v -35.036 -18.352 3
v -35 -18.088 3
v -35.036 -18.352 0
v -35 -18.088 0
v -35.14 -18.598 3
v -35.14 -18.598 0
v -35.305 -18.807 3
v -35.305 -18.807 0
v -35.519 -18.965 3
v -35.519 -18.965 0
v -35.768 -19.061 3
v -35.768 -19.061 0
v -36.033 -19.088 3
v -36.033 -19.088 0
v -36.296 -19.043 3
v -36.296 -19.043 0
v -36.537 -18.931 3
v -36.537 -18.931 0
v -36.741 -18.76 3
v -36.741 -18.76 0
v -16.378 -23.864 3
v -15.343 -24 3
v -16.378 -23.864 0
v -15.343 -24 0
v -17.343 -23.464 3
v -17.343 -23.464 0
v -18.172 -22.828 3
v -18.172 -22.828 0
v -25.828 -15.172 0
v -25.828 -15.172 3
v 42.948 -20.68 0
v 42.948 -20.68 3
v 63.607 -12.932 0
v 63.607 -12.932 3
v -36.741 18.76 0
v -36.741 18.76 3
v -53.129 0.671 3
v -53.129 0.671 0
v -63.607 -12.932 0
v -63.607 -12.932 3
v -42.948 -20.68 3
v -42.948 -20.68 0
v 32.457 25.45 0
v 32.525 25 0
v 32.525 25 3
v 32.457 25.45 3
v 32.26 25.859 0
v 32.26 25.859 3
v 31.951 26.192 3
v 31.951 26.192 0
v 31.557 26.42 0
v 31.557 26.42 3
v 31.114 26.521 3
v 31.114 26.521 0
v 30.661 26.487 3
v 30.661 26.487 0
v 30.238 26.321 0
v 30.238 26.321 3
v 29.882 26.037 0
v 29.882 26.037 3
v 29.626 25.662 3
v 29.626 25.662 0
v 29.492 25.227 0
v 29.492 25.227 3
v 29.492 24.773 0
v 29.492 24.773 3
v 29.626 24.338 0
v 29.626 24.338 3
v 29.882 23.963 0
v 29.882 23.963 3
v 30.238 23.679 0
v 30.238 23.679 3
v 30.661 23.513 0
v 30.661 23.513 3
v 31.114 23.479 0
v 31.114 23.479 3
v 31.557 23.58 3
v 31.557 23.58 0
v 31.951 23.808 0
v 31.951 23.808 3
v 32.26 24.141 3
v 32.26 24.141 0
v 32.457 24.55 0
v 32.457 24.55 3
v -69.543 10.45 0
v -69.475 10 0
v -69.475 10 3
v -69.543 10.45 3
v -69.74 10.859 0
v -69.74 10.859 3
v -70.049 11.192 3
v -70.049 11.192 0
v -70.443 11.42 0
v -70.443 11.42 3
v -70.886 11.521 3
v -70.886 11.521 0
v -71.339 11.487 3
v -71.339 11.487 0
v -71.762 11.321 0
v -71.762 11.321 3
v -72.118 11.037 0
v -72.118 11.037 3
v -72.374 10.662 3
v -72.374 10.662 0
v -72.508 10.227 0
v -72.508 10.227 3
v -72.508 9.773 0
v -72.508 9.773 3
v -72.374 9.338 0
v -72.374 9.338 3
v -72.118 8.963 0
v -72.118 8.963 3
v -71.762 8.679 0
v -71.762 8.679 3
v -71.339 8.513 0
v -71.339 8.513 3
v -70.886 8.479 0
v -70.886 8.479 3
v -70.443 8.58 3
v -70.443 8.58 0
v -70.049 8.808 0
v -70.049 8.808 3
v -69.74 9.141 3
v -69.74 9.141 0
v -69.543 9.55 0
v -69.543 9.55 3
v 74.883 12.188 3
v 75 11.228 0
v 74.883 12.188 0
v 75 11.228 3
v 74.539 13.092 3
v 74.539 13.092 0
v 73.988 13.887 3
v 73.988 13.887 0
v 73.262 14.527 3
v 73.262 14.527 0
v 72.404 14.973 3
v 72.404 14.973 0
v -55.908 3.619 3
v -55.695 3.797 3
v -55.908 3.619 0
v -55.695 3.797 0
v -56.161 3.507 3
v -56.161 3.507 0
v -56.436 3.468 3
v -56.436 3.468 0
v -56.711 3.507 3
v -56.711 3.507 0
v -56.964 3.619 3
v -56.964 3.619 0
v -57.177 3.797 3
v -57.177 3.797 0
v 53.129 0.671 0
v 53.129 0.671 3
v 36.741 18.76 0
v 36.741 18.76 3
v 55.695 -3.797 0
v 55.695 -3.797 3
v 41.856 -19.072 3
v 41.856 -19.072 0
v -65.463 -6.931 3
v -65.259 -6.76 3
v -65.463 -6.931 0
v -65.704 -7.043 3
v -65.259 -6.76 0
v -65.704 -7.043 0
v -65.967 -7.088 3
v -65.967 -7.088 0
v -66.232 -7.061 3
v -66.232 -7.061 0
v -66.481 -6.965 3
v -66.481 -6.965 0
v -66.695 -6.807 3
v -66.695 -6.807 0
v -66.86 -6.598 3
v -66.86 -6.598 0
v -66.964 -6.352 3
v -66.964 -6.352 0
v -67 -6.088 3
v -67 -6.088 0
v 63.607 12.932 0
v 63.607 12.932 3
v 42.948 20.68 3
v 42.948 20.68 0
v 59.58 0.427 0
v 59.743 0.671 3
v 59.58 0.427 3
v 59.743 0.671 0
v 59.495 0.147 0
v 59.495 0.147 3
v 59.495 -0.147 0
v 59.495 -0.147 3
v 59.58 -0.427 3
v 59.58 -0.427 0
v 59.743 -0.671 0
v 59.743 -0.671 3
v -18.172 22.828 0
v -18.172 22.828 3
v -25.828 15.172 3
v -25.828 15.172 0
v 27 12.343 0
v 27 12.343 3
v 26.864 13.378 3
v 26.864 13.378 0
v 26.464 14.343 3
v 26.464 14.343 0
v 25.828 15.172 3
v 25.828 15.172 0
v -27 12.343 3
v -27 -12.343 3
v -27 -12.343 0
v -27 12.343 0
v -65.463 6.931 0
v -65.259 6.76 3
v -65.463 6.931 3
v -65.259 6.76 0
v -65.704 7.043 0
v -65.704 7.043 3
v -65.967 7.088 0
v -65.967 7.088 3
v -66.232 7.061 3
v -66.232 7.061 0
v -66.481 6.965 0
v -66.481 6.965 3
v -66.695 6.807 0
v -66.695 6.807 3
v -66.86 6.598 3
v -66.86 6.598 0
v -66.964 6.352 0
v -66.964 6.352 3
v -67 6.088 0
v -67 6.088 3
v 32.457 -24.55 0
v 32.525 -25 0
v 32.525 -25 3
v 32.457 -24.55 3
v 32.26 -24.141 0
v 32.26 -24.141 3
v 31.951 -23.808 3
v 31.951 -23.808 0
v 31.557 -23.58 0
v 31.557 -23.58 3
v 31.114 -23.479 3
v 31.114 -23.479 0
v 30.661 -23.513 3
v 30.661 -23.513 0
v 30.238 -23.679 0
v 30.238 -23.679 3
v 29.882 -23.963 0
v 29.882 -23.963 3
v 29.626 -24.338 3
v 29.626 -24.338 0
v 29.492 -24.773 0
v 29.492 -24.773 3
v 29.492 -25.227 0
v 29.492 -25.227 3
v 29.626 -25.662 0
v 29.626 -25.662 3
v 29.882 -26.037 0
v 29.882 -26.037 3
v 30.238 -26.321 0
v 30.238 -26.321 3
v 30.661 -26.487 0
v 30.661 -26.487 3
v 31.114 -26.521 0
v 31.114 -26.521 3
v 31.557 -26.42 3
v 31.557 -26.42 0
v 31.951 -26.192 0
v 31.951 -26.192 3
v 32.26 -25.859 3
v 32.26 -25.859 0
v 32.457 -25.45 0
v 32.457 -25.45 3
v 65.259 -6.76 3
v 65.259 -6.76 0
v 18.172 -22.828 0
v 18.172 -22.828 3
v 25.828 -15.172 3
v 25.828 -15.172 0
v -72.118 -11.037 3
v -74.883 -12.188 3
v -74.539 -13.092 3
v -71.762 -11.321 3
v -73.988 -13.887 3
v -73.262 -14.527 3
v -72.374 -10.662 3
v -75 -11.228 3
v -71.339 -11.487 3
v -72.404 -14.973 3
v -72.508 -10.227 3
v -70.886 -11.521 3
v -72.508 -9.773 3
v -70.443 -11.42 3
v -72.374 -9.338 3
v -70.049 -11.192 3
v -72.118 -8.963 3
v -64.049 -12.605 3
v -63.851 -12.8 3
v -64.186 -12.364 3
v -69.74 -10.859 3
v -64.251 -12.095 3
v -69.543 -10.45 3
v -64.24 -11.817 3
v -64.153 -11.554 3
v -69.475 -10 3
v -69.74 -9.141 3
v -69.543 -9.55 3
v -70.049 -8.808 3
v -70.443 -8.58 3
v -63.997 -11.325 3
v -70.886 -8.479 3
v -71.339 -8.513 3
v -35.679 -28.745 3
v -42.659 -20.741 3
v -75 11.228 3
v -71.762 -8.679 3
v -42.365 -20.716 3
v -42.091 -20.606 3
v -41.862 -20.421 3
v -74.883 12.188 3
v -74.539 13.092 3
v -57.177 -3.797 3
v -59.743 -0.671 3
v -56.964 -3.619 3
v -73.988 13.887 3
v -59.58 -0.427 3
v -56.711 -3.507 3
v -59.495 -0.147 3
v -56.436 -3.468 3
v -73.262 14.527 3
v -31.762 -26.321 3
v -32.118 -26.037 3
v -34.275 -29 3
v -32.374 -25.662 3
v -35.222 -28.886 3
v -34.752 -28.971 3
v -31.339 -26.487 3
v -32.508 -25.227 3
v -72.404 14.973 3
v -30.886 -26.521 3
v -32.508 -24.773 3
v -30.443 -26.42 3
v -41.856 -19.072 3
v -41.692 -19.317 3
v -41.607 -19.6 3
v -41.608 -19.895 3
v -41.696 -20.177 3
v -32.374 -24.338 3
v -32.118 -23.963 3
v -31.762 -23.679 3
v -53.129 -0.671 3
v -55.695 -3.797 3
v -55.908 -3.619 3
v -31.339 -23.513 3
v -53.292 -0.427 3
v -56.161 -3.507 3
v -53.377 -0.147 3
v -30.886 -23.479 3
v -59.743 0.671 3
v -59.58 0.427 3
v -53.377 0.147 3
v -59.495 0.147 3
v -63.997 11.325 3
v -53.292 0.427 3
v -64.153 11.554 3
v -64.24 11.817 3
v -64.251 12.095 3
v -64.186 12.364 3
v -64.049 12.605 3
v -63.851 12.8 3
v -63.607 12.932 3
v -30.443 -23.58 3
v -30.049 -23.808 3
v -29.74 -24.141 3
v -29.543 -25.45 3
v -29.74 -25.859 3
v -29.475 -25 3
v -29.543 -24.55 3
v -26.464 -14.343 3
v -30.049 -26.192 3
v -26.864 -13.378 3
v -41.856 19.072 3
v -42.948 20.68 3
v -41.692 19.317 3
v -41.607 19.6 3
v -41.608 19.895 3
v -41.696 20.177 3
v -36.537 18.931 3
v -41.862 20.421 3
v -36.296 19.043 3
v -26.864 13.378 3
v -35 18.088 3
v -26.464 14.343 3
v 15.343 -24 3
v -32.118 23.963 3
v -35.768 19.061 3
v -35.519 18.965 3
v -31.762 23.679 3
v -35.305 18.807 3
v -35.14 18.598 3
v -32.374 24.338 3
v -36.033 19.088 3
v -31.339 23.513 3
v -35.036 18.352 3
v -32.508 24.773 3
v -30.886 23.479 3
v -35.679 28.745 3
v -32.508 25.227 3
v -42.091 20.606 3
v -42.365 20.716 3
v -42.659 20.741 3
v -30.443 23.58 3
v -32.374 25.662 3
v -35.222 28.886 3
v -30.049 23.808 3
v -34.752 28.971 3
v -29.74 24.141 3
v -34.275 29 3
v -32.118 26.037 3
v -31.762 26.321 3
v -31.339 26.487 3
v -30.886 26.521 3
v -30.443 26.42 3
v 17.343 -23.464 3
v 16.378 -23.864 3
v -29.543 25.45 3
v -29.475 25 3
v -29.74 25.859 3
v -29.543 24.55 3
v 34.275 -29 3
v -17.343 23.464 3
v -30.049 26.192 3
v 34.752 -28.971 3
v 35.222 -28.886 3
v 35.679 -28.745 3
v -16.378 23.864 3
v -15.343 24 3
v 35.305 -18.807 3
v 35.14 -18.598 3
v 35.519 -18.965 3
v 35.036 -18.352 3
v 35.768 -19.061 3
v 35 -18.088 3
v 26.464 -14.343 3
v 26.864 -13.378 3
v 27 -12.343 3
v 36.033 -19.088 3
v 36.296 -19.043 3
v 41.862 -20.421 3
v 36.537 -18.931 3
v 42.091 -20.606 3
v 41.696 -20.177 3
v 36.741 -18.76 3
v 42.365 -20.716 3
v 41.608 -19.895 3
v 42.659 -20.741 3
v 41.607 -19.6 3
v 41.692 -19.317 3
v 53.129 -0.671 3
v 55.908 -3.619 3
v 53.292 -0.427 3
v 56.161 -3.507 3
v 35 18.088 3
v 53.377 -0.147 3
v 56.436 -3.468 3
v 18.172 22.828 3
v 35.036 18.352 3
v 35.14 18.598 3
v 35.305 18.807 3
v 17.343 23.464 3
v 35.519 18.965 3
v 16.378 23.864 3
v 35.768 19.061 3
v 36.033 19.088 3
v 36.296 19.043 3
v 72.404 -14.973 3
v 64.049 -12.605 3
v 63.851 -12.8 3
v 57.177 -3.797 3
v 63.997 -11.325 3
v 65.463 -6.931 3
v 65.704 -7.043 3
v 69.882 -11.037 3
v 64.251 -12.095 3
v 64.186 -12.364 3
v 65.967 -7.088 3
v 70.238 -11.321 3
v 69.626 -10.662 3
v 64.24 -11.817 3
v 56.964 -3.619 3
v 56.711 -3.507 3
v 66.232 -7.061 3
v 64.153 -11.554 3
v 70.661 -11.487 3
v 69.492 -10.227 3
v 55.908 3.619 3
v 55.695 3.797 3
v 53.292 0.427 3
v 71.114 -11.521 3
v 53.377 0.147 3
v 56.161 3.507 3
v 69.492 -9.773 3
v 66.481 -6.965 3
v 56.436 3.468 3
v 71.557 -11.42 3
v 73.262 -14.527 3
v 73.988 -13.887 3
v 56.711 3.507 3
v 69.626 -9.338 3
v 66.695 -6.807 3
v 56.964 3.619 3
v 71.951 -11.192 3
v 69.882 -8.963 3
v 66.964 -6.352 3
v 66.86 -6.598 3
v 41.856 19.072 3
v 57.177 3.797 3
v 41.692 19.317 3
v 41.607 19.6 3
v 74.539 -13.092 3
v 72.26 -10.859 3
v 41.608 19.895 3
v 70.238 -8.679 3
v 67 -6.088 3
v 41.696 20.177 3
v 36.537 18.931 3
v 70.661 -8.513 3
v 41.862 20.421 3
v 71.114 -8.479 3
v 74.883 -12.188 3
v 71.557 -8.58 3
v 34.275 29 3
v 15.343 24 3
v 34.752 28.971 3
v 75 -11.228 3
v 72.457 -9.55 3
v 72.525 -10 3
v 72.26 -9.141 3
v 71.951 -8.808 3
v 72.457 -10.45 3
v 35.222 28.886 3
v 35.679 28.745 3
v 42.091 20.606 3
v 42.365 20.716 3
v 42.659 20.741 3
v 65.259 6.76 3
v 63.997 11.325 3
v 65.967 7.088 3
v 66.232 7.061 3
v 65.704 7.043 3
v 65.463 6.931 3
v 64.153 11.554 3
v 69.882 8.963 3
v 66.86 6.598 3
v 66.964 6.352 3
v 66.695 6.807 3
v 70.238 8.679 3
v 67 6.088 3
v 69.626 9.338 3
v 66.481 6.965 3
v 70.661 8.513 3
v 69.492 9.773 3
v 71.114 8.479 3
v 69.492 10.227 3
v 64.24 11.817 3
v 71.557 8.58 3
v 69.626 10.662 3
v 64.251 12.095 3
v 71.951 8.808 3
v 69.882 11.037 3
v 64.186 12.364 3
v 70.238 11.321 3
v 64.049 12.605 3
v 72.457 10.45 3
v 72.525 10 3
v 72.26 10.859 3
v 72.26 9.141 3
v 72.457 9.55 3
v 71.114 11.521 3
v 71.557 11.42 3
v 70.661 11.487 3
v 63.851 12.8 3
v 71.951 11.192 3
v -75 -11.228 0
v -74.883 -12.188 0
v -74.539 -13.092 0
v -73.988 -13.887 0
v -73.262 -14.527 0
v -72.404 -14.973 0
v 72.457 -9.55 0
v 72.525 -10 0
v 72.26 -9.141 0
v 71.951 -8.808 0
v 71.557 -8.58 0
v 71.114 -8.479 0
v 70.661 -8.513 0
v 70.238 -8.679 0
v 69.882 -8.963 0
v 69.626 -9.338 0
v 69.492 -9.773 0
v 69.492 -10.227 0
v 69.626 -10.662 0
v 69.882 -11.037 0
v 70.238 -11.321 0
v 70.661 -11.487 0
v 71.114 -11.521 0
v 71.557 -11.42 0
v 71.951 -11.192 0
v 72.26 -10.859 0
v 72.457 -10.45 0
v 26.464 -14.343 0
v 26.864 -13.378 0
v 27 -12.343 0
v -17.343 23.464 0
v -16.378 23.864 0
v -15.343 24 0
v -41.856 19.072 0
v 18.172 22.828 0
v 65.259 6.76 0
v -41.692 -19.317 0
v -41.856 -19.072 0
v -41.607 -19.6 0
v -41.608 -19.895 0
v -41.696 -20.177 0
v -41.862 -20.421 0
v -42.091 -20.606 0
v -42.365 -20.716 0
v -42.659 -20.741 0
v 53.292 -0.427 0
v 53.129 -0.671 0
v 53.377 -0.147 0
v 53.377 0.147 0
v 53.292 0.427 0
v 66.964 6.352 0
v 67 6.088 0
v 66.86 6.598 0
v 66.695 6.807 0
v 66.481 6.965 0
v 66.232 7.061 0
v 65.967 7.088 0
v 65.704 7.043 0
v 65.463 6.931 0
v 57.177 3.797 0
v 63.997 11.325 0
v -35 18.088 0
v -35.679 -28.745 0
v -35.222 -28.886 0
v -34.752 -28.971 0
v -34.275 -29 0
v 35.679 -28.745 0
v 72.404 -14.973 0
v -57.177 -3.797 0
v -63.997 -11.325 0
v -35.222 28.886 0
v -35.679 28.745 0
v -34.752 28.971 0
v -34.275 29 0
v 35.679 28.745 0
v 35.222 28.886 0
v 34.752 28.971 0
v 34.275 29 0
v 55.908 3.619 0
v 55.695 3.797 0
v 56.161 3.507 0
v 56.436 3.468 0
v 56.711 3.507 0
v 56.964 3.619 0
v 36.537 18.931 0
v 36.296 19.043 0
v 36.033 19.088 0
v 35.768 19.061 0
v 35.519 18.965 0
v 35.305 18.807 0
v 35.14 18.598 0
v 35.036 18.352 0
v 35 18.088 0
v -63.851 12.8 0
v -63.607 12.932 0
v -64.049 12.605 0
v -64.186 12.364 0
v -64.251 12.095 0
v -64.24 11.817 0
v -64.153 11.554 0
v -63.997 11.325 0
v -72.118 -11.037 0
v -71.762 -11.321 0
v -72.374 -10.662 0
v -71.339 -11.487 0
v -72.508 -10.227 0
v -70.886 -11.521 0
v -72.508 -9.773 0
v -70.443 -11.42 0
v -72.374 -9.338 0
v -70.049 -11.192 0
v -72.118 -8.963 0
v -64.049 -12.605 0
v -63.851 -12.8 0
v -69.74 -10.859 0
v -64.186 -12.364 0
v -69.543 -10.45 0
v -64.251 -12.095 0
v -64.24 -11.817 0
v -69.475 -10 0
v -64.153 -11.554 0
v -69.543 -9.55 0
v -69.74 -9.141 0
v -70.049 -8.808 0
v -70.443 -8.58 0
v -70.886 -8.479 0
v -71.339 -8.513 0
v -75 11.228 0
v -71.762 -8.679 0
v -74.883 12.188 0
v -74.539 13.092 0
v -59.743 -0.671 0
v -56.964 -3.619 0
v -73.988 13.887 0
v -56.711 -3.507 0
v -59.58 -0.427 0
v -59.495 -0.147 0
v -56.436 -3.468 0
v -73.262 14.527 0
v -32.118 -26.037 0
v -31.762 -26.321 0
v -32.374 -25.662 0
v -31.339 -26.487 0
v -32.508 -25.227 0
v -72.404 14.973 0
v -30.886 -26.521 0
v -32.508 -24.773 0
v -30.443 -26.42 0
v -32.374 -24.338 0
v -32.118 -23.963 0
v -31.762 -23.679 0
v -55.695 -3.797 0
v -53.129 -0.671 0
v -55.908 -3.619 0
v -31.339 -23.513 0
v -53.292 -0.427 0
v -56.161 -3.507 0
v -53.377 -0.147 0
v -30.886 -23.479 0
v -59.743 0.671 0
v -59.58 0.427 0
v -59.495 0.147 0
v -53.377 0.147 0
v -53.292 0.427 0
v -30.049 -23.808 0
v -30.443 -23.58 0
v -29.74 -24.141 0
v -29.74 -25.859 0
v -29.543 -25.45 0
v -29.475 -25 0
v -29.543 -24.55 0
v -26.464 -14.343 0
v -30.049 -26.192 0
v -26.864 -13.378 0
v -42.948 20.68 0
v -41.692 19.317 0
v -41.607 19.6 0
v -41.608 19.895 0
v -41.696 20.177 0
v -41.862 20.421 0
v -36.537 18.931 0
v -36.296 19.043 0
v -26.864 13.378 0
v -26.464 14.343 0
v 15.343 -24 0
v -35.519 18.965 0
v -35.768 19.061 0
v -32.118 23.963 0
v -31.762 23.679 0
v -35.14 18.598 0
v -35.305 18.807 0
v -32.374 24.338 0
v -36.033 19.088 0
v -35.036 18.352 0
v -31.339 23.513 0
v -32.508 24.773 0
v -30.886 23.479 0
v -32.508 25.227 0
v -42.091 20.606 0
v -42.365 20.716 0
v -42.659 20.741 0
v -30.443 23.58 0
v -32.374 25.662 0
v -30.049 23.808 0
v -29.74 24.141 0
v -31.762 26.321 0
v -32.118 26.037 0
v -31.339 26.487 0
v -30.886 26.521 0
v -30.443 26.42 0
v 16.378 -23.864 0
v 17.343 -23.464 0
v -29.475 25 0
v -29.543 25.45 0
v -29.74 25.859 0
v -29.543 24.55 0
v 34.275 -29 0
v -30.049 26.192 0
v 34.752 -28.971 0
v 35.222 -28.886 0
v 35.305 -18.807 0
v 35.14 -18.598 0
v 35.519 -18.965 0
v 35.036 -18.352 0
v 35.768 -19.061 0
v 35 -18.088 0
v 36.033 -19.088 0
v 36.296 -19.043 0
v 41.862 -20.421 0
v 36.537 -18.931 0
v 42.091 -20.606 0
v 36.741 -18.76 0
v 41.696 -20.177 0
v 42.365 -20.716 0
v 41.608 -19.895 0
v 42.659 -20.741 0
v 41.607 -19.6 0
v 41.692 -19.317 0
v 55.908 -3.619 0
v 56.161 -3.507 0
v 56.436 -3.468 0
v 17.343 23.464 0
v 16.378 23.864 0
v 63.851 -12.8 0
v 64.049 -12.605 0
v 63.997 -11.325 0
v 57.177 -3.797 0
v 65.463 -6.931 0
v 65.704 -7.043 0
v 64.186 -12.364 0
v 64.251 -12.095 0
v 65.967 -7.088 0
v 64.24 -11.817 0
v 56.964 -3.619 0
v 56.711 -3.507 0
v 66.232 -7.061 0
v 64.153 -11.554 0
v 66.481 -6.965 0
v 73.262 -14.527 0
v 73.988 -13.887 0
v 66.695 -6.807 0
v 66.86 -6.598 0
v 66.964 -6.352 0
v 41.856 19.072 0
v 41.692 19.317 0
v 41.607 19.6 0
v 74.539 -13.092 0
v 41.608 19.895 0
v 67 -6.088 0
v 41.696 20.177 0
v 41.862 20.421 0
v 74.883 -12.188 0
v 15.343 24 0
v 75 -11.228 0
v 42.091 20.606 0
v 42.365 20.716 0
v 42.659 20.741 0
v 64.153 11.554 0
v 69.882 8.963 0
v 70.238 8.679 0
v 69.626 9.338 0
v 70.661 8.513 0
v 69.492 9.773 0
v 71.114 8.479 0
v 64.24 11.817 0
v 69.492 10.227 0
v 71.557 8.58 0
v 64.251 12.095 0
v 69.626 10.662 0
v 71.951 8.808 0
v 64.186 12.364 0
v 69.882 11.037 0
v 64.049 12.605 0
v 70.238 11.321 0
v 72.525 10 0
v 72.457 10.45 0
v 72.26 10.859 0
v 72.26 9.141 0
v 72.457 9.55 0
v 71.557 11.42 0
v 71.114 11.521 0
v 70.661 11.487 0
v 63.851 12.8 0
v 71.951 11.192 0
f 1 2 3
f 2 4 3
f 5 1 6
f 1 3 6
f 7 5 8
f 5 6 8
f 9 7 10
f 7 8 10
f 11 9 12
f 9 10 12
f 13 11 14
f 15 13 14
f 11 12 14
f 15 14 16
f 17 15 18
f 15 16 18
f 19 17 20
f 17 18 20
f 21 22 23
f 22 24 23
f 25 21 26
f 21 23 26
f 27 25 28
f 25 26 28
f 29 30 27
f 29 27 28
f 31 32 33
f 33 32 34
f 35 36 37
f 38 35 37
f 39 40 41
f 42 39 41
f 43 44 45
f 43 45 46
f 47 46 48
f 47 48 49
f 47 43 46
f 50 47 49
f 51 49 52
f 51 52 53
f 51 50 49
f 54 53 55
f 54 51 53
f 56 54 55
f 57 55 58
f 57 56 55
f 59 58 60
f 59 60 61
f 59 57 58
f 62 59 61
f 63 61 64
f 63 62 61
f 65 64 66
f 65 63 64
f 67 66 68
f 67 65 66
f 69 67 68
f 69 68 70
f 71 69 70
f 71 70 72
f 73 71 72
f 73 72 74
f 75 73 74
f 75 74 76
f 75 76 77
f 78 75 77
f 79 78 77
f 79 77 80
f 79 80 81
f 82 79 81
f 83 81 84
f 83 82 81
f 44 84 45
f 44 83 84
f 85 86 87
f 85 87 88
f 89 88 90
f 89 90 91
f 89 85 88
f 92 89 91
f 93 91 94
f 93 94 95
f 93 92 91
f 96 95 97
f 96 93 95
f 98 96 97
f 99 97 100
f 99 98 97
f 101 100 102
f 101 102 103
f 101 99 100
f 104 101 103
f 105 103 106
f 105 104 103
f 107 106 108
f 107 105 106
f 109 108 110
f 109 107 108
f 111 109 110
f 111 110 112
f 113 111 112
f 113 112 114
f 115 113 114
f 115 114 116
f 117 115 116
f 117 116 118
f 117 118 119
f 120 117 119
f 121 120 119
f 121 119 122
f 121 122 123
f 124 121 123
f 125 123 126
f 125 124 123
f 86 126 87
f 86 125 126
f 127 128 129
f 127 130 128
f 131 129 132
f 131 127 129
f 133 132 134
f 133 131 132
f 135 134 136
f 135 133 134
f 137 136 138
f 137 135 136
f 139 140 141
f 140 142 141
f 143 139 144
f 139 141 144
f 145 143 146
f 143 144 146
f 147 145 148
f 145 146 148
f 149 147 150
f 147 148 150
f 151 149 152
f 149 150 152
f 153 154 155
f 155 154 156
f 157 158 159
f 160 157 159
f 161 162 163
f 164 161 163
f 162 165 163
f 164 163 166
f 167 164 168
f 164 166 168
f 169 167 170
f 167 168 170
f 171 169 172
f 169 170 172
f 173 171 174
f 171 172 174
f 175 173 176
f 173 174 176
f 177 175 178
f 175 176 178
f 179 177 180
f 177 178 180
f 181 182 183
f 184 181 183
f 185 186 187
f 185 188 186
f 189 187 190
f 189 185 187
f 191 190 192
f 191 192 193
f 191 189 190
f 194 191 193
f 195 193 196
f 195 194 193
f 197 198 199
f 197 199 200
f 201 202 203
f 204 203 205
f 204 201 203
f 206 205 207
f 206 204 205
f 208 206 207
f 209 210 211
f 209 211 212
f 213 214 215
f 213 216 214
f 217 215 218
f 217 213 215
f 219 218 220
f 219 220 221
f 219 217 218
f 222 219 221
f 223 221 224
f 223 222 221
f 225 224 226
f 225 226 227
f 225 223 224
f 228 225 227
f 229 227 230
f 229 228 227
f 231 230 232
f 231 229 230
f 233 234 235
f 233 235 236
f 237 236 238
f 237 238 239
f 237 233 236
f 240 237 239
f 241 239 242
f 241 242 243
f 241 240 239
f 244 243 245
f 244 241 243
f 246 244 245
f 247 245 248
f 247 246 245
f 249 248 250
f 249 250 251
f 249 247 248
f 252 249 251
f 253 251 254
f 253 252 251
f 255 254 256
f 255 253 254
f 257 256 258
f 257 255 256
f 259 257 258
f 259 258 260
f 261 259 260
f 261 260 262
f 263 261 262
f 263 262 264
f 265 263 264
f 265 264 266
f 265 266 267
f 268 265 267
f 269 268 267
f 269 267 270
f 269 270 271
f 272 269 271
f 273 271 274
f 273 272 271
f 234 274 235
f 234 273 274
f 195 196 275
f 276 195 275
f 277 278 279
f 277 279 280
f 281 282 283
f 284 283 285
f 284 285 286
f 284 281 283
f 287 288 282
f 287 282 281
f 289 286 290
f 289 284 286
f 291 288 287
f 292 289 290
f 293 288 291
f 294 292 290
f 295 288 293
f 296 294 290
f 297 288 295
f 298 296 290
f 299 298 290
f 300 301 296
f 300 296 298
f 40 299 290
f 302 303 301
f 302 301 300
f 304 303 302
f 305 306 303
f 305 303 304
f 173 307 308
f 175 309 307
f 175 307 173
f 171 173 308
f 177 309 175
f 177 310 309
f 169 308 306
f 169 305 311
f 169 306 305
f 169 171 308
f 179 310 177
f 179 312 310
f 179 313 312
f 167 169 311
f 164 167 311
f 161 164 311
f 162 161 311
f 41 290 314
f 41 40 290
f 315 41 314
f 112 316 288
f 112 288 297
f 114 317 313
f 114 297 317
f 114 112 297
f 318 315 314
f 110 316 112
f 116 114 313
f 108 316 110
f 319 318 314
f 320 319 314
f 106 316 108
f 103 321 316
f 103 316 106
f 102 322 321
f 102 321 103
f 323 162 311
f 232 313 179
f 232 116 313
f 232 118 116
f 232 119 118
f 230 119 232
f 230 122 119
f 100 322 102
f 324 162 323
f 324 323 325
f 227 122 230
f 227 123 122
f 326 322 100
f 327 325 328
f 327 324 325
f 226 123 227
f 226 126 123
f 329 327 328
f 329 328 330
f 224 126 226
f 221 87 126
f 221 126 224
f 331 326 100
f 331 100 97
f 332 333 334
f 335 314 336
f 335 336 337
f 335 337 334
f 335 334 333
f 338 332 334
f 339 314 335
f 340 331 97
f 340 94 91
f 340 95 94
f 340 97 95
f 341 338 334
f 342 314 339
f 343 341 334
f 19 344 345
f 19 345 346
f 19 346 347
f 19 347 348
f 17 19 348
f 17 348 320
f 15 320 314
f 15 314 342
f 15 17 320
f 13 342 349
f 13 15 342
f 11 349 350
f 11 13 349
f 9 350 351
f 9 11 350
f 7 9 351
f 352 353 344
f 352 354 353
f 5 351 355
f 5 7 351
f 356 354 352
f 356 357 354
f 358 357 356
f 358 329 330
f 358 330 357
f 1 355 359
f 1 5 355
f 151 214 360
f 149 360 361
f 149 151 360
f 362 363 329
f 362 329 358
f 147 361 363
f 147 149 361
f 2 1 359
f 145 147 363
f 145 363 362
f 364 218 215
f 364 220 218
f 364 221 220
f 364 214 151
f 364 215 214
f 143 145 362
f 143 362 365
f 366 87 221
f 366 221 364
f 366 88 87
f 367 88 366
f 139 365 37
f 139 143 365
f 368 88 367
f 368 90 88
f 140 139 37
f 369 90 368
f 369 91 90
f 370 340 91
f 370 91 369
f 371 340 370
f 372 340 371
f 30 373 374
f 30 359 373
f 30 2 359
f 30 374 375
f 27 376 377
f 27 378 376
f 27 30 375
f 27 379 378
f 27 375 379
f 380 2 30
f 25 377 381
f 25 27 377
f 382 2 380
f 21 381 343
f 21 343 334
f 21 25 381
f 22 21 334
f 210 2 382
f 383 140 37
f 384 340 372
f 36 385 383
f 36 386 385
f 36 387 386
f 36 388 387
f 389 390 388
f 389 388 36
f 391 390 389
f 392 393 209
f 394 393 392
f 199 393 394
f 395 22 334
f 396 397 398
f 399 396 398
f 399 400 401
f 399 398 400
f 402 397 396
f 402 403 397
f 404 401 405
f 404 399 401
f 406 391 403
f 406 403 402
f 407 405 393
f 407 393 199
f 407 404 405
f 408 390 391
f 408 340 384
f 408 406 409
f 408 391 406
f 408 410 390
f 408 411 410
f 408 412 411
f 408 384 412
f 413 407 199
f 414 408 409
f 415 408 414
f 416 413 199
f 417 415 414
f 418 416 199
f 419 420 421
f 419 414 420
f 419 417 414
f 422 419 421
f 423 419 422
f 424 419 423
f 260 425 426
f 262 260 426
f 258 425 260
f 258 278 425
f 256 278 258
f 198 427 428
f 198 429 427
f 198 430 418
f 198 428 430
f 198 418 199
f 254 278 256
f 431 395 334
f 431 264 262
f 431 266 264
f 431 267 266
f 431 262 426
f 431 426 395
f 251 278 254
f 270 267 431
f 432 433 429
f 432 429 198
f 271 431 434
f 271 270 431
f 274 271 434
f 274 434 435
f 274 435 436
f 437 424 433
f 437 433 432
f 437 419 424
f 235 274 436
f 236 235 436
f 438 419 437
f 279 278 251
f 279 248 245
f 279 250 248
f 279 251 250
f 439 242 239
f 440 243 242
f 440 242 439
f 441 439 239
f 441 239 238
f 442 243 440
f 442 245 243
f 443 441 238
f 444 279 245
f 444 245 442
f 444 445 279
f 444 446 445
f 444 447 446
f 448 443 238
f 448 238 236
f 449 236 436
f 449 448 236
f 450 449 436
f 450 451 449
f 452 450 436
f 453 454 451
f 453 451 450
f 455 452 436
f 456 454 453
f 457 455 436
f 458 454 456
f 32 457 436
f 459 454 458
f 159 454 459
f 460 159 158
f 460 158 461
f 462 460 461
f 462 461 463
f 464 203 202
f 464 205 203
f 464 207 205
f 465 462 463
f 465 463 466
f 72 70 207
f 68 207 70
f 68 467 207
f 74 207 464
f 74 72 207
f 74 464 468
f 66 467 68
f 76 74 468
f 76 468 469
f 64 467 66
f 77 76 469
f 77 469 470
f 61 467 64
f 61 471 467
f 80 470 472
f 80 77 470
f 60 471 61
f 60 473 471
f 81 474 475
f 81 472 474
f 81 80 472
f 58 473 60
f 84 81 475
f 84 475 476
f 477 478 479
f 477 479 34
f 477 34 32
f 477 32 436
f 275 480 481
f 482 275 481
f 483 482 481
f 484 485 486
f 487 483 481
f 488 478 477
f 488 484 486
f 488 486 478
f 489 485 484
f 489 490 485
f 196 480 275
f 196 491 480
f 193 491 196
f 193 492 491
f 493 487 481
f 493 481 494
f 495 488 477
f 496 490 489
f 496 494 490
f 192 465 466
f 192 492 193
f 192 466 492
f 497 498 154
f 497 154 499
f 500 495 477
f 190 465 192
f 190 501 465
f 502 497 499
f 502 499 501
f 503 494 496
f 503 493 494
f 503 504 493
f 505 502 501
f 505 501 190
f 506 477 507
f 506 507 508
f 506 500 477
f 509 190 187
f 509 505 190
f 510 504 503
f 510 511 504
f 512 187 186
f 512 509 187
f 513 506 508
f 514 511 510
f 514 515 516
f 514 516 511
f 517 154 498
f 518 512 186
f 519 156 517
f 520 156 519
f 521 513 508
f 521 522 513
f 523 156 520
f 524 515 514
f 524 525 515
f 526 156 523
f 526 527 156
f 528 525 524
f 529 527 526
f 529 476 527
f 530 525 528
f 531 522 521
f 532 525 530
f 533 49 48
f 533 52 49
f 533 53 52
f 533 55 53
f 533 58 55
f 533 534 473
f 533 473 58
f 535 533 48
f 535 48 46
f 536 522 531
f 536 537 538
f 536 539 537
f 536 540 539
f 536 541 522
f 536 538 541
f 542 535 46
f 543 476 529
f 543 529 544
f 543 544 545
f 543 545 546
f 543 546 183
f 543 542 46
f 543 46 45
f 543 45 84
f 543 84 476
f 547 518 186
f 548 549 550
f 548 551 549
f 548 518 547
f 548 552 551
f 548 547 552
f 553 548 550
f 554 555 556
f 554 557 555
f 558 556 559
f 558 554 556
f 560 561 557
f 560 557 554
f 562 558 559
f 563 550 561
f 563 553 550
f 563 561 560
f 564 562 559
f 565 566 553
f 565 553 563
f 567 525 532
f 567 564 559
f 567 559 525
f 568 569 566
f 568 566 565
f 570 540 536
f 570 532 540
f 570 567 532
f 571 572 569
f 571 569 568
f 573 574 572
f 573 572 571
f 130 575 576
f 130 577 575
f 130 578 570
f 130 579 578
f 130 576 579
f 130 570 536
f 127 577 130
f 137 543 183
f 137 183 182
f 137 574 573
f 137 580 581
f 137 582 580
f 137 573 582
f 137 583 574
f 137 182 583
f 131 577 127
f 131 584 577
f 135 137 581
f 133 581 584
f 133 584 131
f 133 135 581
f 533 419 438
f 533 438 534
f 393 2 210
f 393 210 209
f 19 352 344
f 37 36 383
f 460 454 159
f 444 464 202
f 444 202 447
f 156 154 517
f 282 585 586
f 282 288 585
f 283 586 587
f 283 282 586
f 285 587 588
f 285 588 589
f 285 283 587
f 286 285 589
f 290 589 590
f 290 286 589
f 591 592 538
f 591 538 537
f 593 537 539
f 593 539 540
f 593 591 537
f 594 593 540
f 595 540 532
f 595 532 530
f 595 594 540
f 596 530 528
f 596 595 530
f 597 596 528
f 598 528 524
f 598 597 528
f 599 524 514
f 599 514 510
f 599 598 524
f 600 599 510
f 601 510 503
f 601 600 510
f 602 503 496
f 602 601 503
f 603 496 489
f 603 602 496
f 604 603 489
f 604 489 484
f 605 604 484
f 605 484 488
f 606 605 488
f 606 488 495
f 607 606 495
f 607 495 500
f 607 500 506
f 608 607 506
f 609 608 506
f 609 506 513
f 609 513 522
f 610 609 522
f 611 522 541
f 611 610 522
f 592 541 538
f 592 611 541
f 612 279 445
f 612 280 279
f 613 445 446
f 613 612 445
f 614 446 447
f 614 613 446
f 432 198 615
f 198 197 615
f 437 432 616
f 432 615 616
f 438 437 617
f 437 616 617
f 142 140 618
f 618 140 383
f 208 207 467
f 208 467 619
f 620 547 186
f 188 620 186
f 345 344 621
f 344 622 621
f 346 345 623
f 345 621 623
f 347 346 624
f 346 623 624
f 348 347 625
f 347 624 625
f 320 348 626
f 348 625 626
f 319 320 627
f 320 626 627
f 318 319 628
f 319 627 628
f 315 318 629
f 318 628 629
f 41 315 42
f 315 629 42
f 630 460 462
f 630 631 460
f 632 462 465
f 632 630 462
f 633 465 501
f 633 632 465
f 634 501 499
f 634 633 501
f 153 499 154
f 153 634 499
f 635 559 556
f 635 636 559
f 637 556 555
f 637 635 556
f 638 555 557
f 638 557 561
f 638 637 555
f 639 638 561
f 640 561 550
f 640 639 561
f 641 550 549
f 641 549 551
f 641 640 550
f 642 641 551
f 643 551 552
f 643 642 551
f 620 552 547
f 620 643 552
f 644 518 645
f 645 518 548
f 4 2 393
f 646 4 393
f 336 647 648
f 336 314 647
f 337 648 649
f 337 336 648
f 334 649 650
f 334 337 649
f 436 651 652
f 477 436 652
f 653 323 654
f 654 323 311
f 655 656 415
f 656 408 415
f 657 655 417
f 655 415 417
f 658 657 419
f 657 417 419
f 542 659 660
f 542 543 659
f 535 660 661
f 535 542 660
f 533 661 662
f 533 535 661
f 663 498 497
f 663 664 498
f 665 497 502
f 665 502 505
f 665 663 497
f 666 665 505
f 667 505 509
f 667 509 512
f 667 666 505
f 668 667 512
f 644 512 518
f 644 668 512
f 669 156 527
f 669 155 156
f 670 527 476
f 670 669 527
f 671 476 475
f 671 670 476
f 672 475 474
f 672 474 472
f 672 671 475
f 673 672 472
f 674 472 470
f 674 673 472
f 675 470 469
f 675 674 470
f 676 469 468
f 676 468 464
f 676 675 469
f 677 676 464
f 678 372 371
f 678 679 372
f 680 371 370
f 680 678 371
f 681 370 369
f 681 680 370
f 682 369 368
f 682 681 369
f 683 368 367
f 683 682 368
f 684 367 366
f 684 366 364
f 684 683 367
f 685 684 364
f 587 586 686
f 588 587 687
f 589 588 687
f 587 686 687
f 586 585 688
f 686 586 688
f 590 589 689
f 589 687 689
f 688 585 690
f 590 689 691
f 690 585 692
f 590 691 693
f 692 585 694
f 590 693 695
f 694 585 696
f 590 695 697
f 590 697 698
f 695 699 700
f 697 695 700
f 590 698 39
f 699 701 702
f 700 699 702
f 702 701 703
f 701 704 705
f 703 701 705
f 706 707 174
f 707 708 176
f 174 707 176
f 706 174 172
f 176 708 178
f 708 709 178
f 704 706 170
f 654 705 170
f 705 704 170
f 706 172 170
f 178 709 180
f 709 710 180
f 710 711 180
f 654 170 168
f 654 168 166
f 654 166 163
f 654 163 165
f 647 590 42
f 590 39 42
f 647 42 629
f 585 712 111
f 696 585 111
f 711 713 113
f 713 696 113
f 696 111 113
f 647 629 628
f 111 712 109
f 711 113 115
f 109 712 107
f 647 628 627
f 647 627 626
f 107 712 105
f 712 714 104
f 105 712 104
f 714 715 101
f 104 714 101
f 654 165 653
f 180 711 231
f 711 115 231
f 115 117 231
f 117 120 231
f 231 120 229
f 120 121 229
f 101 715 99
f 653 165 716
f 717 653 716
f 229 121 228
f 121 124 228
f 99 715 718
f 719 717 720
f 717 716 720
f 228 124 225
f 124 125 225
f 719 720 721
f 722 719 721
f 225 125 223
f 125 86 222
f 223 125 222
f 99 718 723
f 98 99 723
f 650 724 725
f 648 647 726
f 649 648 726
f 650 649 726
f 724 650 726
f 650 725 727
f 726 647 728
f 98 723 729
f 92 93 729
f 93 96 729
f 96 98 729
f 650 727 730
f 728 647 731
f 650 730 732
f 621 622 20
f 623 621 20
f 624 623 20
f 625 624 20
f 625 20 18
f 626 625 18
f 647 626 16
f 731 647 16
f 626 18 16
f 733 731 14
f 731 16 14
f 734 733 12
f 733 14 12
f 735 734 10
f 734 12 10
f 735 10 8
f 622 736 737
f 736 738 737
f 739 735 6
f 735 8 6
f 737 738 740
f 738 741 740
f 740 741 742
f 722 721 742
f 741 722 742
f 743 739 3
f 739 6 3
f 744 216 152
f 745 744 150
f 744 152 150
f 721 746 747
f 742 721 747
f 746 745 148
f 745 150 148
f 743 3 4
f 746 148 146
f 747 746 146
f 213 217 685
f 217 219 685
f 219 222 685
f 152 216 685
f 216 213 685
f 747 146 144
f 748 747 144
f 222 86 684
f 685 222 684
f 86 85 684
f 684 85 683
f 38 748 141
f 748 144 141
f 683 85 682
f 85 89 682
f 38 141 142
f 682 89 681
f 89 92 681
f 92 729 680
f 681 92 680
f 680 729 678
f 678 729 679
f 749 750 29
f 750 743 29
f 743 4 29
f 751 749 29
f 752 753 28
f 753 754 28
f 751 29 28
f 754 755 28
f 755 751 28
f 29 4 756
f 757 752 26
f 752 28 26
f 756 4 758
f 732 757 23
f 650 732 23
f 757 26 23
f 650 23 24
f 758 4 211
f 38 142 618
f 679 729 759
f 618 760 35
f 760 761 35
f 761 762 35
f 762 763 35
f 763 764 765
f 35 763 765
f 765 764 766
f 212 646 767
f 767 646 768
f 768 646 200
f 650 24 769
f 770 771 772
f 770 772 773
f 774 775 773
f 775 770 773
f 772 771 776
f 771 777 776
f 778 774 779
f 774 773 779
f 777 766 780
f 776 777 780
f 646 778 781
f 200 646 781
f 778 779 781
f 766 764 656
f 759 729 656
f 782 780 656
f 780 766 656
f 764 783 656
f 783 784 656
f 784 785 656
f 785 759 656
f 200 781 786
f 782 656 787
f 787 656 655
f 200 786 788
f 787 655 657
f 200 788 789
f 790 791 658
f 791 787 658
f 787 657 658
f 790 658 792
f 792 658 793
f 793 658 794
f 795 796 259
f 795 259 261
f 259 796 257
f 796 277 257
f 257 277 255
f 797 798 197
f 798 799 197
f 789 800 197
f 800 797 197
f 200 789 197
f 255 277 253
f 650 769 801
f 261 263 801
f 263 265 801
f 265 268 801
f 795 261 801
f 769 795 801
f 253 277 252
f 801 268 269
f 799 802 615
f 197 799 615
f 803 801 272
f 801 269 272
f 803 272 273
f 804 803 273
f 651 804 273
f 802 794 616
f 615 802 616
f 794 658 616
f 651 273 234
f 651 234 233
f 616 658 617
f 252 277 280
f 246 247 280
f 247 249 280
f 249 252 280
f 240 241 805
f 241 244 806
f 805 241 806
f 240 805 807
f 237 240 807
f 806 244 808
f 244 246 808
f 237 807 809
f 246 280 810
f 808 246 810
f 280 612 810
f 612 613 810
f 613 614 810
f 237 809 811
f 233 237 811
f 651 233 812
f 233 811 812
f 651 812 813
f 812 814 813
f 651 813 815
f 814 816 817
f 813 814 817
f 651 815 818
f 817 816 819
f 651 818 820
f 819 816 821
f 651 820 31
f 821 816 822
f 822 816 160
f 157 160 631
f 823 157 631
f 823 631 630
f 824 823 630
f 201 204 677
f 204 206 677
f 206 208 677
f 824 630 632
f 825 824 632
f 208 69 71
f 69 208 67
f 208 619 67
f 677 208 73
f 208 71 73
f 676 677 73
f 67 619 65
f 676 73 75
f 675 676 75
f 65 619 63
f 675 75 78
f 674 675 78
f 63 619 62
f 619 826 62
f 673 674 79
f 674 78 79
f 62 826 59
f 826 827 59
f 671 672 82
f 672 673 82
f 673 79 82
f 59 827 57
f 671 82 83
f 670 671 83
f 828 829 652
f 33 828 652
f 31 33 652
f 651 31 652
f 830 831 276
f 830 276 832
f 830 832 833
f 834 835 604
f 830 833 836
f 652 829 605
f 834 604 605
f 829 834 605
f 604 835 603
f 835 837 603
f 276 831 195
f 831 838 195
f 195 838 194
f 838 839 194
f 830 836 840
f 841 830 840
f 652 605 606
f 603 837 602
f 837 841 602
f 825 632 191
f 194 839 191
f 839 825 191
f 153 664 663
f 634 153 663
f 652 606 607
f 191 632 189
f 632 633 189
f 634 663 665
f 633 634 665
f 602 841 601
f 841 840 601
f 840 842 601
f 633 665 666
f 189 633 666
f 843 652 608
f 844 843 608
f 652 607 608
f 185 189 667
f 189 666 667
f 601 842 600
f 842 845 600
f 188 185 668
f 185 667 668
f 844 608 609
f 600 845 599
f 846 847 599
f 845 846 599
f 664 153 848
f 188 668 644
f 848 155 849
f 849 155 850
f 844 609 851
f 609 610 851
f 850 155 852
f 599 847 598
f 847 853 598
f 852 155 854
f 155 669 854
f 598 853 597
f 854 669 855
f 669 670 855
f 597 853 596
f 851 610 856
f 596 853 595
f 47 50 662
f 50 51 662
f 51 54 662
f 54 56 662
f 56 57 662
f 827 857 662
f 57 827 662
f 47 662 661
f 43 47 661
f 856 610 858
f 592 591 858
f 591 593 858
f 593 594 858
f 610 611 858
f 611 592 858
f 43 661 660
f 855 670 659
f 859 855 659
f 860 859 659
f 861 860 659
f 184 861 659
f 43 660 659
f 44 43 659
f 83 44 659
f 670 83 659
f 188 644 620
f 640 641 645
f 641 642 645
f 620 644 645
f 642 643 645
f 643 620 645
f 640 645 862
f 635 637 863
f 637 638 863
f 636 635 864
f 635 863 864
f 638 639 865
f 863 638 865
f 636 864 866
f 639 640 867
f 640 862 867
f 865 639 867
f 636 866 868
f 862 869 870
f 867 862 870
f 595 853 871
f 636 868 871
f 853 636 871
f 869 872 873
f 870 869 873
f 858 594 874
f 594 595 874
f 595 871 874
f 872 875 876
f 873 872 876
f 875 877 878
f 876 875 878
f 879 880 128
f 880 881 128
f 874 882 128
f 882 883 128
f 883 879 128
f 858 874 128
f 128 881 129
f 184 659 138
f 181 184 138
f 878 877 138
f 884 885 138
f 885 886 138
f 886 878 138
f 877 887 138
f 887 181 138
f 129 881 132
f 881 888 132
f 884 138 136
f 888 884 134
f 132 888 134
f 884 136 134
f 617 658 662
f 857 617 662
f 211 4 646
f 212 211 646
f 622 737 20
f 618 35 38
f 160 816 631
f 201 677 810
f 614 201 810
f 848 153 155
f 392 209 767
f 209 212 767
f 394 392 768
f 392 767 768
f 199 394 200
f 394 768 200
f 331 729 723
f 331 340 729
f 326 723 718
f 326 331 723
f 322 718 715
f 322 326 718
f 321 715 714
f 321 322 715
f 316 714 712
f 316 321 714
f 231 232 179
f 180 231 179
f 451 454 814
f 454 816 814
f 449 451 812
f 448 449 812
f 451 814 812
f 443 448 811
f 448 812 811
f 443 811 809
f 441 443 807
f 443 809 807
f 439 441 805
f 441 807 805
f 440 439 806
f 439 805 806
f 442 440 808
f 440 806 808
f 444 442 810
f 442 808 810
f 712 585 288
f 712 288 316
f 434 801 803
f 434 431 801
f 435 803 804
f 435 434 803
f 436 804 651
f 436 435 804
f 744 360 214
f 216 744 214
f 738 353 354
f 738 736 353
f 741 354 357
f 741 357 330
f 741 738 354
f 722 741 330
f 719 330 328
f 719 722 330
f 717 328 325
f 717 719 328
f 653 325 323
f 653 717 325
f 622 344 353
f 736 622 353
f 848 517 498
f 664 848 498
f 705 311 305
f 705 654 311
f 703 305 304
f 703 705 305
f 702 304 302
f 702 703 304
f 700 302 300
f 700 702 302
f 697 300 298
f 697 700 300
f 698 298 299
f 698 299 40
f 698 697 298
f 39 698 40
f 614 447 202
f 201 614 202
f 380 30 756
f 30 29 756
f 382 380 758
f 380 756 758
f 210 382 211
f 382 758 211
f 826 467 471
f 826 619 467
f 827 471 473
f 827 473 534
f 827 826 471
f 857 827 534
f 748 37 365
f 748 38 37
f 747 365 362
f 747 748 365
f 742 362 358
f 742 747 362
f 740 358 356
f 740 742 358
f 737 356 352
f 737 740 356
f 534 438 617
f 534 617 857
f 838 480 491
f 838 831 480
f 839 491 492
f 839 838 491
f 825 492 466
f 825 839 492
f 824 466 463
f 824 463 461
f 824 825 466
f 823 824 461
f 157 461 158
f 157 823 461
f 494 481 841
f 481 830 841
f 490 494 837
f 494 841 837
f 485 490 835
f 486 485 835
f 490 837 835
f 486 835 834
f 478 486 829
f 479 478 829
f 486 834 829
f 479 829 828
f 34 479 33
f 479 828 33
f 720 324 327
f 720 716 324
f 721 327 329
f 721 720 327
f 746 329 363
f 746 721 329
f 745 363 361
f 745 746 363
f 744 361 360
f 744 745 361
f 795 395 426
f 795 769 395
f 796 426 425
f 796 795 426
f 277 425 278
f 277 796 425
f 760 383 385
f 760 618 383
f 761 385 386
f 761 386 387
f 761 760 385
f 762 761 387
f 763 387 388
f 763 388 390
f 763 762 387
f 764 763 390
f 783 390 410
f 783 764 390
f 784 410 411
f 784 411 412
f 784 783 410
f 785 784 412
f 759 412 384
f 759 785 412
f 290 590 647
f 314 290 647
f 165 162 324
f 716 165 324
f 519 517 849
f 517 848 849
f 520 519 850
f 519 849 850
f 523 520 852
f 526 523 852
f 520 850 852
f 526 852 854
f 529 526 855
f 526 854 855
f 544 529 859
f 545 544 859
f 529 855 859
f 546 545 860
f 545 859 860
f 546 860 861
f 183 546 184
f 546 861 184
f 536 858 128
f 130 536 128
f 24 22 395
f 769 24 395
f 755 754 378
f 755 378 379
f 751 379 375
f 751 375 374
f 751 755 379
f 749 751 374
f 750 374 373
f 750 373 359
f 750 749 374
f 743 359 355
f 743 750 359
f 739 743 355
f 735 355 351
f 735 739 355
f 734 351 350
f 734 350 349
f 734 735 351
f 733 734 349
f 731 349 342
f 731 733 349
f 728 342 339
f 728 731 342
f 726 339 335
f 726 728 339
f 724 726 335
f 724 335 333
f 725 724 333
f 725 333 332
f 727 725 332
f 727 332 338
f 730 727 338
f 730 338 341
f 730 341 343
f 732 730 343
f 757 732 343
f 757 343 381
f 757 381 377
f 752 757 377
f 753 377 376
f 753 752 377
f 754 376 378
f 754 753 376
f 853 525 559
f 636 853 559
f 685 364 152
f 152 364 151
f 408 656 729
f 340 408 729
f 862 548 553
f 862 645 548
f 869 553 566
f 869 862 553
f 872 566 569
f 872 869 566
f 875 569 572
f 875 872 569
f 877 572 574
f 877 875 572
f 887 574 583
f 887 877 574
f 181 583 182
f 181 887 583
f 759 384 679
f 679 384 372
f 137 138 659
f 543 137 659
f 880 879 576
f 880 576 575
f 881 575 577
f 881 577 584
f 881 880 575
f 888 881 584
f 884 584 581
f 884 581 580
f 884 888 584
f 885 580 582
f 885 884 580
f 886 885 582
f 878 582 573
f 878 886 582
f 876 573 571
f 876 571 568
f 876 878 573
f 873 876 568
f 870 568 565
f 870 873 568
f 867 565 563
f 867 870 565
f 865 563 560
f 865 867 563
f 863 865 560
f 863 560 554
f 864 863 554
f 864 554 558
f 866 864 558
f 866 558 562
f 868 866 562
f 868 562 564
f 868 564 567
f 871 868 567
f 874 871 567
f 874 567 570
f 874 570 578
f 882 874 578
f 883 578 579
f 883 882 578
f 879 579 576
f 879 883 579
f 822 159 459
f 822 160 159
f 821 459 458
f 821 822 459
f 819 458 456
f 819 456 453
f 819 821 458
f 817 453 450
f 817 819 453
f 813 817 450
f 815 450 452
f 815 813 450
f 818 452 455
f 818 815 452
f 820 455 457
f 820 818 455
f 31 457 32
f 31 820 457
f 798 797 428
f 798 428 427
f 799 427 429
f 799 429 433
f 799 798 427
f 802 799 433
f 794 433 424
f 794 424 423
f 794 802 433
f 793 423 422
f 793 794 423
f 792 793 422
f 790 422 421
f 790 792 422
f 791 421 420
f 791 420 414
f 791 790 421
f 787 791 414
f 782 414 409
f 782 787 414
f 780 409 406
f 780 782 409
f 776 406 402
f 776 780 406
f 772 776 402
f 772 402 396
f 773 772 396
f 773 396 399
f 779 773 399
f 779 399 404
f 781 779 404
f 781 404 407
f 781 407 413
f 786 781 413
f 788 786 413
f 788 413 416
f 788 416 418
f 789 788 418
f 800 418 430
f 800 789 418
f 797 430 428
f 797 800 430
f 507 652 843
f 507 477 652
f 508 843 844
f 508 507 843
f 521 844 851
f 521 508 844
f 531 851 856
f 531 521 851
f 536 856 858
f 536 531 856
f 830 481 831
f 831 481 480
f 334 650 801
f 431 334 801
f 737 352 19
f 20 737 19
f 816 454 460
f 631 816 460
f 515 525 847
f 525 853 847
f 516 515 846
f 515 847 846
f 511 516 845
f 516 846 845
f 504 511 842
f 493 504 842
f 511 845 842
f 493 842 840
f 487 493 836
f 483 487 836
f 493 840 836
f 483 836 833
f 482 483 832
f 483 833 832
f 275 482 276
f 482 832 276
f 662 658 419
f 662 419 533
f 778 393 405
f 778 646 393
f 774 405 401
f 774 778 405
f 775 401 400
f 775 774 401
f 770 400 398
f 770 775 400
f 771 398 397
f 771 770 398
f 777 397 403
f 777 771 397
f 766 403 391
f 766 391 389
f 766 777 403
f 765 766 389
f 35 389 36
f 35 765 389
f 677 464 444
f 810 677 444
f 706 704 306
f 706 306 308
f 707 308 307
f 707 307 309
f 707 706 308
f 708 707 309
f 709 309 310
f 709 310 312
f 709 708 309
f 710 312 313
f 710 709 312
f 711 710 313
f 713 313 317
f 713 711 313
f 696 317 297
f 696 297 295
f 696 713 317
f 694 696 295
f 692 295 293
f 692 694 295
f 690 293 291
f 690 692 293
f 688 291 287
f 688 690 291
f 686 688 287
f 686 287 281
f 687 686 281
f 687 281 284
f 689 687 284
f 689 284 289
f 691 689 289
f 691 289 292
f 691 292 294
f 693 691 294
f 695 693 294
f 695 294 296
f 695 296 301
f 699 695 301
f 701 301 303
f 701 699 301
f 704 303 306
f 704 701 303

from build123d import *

# Parameters (mm, degrees)
SKETCH_1_W          = 40
SKETCH_1_H          = 28
SKETCH_1_R          = 1.525
SKETCH_1_W_2        = 70
SKETCH_1_H_2        = 15
EXTRUDE_1_DEPTH     = 3
FILLET_1_R          = 4
SKETCH_2_W          = 54
SKETCH_2_H          = 48
CUT_EXTRUDE_1_DEPTH = 3
CHAMFER_1_SIZE      = 10
FILLET_2_R          = 4
FILLET_3_R          = 1


with BuildPart() as part:
    # 草图1 → 凸台-拉伸1 (new body)
    with BuildSketch(Plane.XY):
        Polygon((-35, 29), (-75, 14), (-35, 14), align=None)
        with Locations((-55, 0)):
            Rectangle(SKETCH_1_W, SKETCH_1_H)
        with Locations((-71, -10)):
            Circle(SKETCH_1_R, mode=Mode.SUBTRACT)
        with Locations((-71, 10)):
            Circle(SKETCH_1_R, mode=Mode.SUBTRACT)
        Polygon((-35, -14), (-75, -14), (-35, -29), align=None)
        with Locations((0, -21.5)):
            Rectangle(SKETCH_1_W_2, SKETCH_1_H_2)
        with Locations((-31, -25)):
            Circle(SKETCH_1_R, mode=Mode.SUBTRACT)
        with Locations((31, -25)):
            Circle(SKETCH_1_R, mode=Mode.SUBTRACT)
        Rectangle(SKETCH_1_W_2, SKETCH_1_H)
        with Locations((0, 21.5)):
            Rectangle(SKETCH_1_W_2, SKETCH_1_H_2)
        with Locations((-31, 25)):
            Circle(SKETCH_1_R, mode=Mode.SUBTRACT)
        with Locations((31, 25)):
            Circle(SKETCH_1_R, mode=Mode.SUBTRACT)
        Polygon((75, 14), (35, 29), (35, 14), align=None)
        with Locations((55, 0)):
            Rectangle(SKETCH_1_W, SKETCH_1_H)
        with Locations((71, -10)):
            Circle(SKETCH_1_R, mode=Mode.SUBTRACT)
        with Locations((71, 10)):
            Circle(SKETCH_1_R, mode=Mode.SUBTRACT)
        Polygon((75, -14), (35, -14), (35, -29), align=None)
    extrude(amount=EXTRUDE_1_DEPTH)

    # 圆角1
    fillet_1_edges = [part.edges().sort_by_distance(p)[0] for p in [
        (-35, 29, 1.5),
        (35, 29, 1.5),
        (75, 14, 1.5),
        (75, -14, 1.5),
        (35, -29, 1.5),
        (-35, -29, 1.5),
        (-75, -14, 1.5),
        (-75, 14, 1.5),
    ]]
    fillet(fillet_1_edges, radius=FILLET_1_R)

    # 草图2 → 切除-拉伸1 (cut)
    with BuildSketch(Plane.XY.offset(3)):
        Polygon((-56.436014311, 2.978767355), (-39.087503195, 22.127183961), (-64.985617819, 12.415390977), align=None)
        Polygon((-35, -20.681230304), (-35, 20.681230304), (-53.737243982, 0), align=None)
        Polygon((-39.087503195, -22.127183961), (-56.436014311, -2.978767355), (-64.985617819, -12.415390977), align=None)
        Polygon((-67, -8.681230304), (-59.134784639, 0), (-67, 8.681230304), align=None)
        Rectangle(SKETCH_2_W, SKETCH_2_H)
        Polygon((35, -20.681230304), (53.737243982, 0), (35, 20.681230304), align=None)
        Polygon((39.087503195, 22.127183961), (56.436014311, 2.978767355), (64.985617819, 12.415390977), align=None)
        Polygon((67, -8.681230304), (67, 8.681230304), (59.134784639, 0), align=None)
        Polygon((64.985617819, -12.415390977), (56.436014311, -2.978767355), (39.087503195, -22.127183961), align=None)
    extrude(amount=-CUT_EXTRUDE_1_DEPTH, mode=Mode.SUBTRACT)

    # 倒角1
    chamfer_1_edges = [part.edges().sort_by_distance(p)[0] for p in [
        (-27, -24, 1.5),
        (-27, 24, 1.5),
        (27, 24, 1.5),
        (27, -24, 1.5),
    ]]
    chamfer(chamfer_1_edges, length=CHAMFER_1_SIZE)

    # 圆角2
    fillet_2_edges = [part.edges().sort_by_distance(p)[0] for p in [
        (17, -24, 1.5),
        (-17, -24, 1.5),
        (-27, 14, 1.5),
        (-27, -14, 1.5),
        (27, 14, 1.5),
        (27, -14, 1.5),
        (-17, 24, 1.5),
        (17, 24, 1.5),
    ]]
    fillet(fillet_2_edges, radius=FILLET_2_R)

    # 圆角3
    fillet_3_edges = [part.edges().sort_by_distance(p)[0] for p in [
        (39.087503195, 22.127183961, 1.5),
        (64.985617819, 12.415390977, 1.5),
        (56.436014311, 2.978767355, 1.5),
        (35, -20.681230304, 1.5),
        (35, 20.681230304, 1.5),
        (53.737243982, 0, 1.5),
        (64.985617819, -12.415390977, 1.5),
        (39.087503195, -22.127183961, 1.5),
        (56.436014311, -2.978767355, 1.5),
        (67, 8.681230304, 1.5),
        (67, -8.681230304, 1.5),
        (59.134784639, 0, 1.5),
        (-56.436014311, -2.978767355, 1.5),
        (-39.087503195, -22.127183961, 1.5),
        (-64.985617819, -12.415390977, 1.5),
        (-53.737243982, 0, 1.5),
        (-35, 20.681230304, 1.5),
        (-35, -20.681230304, 1.5),
        (-67, 8.681230304, 1.5),
        (-59.134784639, 0, 1.5),
        (-67, -8.681230304, 1.5),
        (-64.985617819, 12.415390977, 1.5),
        (-39.087503195, 22.127183961, 1.5),
        (-56.436014311, 2.978767355, 1.5),
    ]]
    fillet(fillet_3_edges, radius=FILLET_3_R)


solid = part.part
